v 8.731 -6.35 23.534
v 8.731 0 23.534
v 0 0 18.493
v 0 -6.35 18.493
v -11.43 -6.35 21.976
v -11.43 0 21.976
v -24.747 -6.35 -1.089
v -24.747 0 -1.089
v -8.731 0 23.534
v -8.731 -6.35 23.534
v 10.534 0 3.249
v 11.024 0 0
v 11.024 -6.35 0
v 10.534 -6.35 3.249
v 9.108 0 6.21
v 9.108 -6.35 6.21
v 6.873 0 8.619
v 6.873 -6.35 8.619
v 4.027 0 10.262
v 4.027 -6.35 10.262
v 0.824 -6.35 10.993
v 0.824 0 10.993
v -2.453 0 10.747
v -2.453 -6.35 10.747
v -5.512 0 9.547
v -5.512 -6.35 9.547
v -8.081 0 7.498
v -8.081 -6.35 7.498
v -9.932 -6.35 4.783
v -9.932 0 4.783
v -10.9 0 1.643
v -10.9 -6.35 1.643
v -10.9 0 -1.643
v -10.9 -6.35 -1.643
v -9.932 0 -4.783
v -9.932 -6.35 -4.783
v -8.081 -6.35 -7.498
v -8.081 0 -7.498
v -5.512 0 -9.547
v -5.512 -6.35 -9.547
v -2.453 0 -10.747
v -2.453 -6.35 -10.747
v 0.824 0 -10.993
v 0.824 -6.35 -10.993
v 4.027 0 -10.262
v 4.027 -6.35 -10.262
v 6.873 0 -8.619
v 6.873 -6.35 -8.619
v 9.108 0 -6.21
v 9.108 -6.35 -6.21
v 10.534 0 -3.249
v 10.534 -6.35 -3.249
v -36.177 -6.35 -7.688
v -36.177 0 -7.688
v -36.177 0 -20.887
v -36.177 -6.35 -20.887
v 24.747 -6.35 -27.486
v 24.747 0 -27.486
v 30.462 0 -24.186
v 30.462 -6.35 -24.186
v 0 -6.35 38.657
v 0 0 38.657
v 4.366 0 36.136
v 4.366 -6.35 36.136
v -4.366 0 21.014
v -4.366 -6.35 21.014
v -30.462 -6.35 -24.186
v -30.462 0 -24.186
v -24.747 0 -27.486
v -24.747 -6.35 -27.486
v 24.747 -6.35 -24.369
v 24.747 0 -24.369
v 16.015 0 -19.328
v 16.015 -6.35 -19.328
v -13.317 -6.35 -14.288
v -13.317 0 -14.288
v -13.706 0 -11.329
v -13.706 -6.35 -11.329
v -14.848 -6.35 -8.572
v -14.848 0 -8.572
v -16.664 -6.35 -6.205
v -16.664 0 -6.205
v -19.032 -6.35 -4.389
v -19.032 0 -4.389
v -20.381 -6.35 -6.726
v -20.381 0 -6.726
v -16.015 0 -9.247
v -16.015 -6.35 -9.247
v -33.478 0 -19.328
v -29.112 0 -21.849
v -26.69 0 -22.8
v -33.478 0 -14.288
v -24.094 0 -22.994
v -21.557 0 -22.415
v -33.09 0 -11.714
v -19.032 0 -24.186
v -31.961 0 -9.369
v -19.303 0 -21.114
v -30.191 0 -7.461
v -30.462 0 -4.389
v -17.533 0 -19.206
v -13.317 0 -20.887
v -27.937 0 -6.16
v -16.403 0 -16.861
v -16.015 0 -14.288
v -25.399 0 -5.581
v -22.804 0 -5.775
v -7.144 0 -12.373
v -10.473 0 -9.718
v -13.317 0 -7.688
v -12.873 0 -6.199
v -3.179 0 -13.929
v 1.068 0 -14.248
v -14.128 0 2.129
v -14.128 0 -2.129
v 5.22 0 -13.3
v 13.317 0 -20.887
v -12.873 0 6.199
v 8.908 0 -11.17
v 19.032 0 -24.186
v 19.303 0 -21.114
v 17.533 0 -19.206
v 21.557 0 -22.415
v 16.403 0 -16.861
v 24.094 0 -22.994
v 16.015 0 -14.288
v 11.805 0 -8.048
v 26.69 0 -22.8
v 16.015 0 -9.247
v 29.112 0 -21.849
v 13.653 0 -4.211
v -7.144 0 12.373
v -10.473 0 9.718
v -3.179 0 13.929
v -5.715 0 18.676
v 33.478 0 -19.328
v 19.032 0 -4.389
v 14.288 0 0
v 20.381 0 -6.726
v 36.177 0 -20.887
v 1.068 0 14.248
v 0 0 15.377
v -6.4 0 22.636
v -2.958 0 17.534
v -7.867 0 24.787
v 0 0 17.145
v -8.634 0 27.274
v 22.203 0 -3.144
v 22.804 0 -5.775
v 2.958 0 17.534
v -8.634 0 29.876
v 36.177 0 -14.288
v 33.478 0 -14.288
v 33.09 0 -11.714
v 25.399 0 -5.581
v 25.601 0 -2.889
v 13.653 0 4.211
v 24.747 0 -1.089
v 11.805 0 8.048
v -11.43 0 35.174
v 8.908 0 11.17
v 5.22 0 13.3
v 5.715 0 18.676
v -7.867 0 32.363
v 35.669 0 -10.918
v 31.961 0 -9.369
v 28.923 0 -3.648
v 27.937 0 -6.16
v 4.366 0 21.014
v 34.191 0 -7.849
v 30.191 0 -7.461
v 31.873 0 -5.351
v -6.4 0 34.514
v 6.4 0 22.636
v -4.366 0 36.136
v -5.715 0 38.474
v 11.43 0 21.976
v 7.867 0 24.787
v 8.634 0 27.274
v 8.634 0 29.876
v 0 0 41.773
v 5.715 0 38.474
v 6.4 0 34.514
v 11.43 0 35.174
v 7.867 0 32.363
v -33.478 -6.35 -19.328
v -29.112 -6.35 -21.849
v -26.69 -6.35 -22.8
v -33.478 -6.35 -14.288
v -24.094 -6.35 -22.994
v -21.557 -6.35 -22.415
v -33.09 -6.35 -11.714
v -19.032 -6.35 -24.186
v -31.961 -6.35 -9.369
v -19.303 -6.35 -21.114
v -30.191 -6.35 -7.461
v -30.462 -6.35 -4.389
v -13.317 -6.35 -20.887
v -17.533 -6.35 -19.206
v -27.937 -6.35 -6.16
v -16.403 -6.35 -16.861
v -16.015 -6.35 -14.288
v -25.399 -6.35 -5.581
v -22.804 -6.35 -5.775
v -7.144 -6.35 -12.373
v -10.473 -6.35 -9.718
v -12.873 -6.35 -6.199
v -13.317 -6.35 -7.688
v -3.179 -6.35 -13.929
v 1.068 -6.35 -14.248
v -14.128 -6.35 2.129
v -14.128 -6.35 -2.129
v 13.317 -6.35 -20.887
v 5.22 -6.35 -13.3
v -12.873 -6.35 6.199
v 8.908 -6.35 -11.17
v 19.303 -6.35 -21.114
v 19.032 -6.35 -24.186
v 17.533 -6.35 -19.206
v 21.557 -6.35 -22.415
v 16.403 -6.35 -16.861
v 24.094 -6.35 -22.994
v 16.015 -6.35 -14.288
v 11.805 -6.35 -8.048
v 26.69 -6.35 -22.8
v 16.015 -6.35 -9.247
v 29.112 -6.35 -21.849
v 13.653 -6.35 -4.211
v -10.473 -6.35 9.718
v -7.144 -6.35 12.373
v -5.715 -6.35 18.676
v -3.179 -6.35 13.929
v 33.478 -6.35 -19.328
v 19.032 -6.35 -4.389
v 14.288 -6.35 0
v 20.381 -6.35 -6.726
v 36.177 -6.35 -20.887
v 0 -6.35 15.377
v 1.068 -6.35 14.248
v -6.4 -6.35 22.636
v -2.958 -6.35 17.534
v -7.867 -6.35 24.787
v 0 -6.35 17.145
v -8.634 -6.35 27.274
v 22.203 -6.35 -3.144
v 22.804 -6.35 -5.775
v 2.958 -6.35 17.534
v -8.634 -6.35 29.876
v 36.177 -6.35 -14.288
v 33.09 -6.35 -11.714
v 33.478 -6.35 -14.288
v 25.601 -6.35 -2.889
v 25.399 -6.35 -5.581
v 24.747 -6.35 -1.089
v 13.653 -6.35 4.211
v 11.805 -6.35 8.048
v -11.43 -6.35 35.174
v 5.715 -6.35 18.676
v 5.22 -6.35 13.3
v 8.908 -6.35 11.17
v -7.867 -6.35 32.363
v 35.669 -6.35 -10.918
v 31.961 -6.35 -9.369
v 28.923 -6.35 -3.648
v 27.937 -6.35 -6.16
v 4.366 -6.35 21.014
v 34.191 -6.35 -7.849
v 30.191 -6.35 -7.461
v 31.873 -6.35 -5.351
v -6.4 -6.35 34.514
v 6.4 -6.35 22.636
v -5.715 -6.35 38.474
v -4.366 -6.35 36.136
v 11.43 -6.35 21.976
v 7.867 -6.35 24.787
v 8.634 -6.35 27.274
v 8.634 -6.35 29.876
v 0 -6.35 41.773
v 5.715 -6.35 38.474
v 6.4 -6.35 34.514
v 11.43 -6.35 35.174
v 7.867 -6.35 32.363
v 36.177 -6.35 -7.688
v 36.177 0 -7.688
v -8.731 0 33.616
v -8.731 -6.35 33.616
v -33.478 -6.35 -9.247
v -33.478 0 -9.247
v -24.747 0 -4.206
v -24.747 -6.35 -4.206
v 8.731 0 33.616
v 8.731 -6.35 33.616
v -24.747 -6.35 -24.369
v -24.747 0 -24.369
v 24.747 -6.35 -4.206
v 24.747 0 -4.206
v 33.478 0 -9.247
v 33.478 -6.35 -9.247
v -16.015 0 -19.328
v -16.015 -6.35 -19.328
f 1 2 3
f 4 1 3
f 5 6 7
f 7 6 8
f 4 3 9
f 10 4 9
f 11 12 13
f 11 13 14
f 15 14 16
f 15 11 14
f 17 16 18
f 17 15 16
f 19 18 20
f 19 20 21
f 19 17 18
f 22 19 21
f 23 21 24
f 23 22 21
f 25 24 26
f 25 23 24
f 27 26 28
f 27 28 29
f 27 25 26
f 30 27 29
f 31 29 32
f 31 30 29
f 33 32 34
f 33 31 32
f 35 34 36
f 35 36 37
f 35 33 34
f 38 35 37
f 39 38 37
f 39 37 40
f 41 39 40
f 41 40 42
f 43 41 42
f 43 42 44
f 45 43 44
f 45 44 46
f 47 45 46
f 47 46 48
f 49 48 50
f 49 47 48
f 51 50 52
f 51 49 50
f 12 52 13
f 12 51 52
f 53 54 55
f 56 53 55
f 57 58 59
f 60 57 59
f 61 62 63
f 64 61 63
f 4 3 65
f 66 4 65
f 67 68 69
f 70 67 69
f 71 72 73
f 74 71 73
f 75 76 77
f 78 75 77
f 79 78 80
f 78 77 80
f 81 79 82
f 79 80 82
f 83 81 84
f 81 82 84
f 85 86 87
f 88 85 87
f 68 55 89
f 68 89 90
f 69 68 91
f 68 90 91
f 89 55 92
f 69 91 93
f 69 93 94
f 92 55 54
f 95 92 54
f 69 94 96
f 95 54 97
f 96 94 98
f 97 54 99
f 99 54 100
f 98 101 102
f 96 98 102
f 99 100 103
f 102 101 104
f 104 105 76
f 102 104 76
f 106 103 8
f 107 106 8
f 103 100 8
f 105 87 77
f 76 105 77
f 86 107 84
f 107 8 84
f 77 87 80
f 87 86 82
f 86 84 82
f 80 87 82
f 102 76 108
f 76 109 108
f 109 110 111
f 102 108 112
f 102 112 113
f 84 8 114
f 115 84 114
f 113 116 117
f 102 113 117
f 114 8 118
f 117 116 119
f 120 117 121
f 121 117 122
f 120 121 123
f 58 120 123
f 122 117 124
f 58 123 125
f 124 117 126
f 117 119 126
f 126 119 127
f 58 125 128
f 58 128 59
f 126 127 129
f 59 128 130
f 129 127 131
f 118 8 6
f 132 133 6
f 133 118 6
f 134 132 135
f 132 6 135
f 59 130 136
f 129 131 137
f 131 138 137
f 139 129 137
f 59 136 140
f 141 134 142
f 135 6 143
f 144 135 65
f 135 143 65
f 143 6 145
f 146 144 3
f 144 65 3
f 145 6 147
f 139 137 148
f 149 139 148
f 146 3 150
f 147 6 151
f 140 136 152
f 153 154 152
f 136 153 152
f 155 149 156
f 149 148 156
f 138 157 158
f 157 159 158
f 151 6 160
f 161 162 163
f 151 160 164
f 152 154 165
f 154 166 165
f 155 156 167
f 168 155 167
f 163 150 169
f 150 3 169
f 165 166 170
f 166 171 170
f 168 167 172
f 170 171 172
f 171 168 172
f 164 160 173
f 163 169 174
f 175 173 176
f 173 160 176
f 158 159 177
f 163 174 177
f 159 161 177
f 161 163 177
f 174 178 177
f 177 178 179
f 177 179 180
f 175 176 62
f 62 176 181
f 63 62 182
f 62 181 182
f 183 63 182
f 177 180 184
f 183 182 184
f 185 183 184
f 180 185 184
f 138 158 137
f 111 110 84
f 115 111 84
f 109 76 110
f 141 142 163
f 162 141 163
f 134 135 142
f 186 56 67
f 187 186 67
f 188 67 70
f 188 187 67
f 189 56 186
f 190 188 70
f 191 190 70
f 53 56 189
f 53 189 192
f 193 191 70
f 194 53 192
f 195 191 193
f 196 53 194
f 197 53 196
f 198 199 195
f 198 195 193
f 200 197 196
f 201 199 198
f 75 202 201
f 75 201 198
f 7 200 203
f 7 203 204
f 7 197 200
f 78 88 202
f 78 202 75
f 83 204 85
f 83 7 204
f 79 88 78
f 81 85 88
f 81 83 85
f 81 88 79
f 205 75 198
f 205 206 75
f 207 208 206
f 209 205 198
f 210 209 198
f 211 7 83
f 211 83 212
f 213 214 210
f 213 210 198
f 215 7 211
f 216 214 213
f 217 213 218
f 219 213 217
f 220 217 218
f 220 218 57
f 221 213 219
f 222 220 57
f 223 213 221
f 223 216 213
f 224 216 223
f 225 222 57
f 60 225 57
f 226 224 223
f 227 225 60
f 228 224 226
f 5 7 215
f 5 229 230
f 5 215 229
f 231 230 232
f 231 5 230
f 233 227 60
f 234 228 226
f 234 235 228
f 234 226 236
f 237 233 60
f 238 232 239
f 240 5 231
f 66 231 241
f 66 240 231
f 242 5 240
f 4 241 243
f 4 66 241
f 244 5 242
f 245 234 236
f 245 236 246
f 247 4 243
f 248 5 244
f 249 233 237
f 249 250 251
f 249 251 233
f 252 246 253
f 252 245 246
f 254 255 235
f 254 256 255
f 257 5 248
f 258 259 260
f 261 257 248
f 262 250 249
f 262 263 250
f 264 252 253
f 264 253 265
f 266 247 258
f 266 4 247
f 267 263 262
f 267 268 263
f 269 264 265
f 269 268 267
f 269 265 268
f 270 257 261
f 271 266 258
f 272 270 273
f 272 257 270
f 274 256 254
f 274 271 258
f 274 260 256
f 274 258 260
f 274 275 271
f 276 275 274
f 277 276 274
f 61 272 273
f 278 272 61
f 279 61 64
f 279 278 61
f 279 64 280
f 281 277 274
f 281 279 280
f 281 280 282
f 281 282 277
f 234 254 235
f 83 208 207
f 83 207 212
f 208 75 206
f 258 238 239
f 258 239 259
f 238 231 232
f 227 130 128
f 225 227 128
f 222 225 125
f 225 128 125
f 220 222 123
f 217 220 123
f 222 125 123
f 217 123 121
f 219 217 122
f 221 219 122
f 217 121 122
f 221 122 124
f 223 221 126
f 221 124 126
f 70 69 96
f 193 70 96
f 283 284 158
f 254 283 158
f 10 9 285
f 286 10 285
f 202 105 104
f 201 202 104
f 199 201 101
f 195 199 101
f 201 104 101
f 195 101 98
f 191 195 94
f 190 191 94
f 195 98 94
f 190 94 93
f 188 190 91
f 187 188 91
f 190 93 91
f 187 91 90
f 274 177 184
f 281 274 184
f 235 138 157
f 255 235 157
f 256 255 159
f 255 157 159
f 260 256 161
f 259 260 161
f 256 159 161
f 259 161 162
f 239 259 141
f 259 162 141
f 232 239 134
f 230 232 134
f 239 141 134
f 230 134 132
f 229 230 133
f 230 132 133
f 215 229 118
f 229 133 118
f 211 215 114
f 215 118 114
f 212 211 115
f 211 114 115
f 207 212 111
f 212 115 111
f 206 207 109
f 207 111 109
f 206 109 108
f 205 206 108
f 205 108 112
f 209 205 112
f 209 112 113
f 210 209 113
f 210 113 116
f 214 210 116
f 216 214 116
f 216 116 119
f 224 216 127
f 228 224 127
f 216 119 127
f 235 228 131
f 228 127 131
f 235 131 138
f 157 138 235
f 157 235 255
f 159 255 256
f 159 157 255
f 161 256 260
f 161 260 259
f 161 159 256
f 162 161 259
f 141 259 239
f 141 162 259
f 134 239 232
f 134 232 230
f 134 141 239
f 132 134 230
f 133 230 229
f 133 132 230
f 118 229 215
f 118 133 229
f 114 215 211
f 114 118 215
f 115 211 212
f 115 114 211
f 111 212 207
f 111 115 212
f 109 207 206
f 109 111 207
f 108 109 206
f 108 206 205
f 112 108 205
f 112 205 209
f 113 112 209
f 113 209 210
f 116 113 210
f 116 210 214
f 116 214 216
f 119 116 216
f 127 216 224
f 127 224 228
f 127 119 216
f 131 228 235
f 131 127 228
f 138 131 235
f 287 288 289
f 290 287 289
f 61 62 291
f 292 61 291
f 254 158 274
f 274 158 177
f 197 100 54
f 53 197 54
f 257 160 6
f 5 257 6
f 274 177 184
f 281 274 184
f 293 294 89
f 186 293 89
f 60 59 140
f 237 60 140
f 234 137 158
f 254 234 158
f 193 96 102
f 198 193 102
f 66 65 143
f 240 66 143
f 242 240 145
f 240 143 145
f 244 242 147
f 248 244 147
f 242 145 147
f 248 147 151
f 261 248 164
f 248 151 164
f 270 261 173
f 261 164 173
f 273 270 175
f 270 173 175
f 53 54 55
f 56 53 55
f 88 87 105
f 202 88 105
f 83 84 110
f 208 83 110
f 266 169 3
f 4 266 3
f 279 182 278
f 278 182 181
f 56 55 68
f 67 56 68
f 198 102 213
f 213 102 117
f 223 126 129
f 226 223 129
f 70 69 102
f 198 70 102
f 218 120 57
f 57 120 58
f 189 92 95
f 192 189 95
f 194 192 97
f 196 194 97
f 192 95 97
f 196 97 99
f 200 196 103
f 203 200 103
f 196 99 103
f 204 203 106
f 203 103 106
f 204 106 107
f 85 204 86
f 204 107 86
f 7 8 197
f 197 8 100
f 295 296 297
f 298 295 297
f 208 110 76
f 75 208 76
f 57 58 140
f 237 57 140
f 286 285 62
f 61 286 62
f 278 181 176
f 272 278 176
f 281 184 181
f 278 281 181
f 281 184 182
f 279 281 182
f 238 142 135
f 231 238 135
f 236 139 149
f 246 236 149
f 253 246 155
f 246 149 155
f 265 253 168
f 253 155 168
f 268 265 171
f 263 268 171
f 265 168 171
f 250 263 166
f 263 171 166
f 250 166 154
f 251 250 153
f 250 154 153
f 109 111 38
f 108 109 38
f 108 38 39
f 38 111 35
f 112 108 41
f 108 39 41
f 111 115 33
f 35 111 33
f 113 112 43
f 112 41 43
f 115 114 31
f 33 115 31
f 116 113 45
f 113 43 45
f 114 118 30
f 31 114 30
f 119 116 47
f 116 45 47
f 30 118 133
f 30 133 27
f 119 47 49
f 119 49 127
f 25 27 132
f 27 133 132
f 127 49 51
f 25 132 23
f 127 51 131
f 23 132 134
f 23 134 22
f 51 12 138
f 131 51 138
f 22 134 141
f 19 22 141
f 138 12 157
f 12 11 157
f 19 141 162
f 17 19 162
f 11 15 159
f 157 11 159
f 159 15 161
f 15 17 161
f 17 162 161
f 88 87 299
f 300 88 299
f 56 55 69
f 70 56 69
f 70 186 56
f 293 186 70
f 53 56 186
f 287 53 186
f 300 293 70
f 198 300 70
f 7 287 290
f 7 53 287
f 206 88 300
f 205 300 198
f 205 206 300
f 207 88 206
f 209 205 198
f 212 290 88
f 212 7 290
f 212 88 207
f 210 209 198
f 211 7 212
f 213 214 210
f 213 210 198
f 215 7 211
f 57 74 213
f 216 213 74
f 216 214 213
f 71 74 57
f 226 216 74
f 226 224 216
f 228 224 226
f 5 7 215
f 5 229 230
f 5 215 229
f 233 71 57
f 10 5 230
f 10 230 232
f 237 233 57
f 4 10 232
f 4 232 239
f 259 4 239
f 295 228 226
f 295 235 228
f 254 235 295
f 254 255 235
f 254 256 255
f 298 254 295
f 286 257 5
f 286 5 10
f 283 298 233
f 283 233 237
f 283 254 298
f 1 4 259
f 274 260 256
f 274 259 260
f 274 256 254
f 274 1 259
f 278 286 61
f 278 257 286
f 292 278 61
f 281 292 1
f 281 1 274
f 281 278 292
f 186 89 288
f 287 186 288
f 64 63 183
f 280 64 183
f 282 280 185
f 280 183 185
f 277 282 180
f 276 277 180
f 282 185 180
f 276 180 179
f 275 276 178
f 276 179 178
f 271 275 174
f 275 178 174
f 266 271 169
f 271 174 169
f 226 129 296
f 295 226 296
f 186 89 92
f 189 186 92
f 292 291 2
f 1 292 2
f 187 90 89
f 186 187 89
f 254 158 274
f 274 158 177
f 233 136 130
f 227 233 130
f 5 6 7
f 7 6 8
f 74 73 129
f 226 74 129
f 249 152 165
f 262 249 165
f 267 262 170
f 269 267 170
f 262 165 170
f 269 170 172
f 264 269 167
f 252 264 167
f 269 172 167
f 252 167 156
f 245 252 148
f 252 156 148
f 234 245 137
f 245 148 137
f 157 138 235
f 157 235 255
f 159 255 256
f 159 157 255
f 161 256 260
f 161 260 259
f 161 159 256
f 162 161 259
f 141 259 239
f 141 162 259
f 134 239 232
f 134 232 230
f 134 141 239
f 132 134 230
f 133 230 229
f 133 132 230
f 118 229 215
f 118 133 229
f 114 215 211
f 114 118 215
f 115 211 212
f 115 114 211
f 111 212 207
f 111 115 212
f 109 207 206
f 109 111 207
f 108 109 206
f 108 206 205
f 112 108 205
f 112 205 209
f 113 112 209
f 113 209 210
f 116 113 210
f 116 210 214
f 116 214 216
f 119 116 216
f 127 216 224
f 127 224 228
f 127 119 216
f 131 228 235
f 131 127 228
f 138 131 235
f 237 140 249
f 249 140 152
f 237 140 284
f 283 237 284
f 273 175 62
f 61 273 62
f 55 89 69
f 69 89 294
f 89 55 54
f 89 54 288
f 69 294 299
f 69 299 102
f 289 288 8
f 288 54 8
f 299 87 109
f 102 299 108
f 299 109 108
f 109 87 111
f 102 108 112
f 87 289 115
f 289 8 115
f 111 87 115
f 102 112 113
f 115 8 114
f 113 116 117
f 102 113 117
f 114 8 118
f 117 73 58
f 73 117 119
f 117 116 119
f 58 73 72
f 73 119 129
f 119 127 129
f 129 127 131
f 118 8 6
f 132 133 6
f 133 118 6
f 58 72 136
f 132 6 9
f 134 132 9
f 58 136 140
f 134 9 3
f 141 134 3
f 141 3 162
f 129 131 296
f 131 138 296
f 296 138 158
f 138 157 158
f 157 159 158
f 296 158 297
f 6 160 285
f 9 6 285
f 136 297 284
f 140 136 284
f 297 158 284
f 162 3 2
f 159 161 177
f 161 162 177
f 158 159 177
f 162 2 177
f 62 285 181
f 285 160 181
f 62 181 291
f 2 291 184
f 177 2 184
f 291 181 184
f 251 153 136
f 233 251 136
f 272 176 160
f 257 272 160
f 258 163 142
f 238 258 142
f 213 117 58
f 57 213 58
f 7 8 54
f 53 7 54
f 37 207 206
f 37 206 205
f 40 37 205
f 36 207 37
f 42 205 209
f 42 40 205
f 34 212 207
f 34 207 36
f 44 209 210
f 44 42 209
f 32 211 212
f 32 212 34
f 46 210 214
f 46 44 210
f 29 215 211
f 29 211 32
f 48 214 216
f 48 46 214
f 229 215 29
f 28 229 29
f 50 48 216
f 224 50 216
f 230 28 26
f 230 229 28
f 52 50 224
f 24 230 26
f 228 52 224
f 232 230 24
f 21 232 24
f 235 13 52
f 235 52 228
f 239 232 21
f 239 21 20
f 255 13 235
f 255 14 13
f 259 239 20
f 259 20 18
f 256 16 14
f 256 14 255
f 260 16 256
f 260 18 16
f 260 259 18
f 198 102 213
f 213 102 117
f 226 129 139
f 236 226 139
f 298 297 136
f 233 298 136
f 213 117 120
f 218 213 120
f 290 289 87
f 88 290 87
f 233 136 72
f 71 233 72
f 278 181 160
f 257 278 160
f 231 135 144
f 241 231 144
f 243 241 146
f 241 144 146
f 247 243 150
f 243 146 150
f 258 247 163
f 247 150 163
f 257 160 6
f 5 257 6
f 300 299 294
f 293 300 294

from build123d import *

# Parameters (mm, degrees)
F1_R     = 14.2875
F2_DEPTH = 6.35
F0_R     = 14.2875
F0_R_2   = 11.0236
F3_DEPTH = 6.35


with BuildPart() as f2:
    # F1 (on Front) → F2 (new body)
    with BuildSketch(Plane.XZ):
        with BuildLine():
            Line((-36.1766759131, -14.2874998792), (-36.1766759131, -20.8866135768))
            Line((-36.1766759131, -20.8866135768), (-30.4616760977, -24.1861702587))
            ThreePointArc((-30.4616760977, -24.1861702587), (-34.6453463619, -20.0024998554), (-36.1766759131, -14.2874998792))
        make_face()
        with BuildLine():
            Line((-36.1766759131, -7.6883864232), (-36.1766759131, -14.2874998792))
            ThreePointArc((-36.1766759131, -14.2874998792), (-34.6453462642, -8.5724999754), (-30.4616759686, -4.3888296668))
            Line((-30.4616759686, -4.3888296668), (-36.1766759131, -7.6883864232))
        make_face()
        with BuildLine():
            ThreePointArc((-30.4616759686, -4.3888296668), (-34.6453462642, -8.5724999754), (-36.1766759131, -14.2874998792))
            ThreePointArc((-36.1766759131, -14.2874998792), (-34.6453463619, -20.0024998554), (-30.4616760977, -24.1861702587))
            ThreePointArc((-30.4616760977, -24.1861702587), (-24.7466762295, -25.7175), (-19.0316762765, -24.186170575))
            ThreePointArc((-19.0316762765, -24.186170575), (-14.8480056528, -20.0025001817), (-13.3166759131, -14.2875))
            ThreePointArc((-13.3166759131, -14.2875), (-14.8480056284, -8.5724998605), (-19.0316761921, -4.3888294737))
            ThreePointArc((-19.0316761921, -4.3888294737), (-24.7466761062, -2.8575), (-30.4616759686, -4.3888296668))
        make_face()
        with BuildLine():
            ThreePointArc((-16.0154259131, -14.2875), (-20.3810506973, -21.8489841822), (-29.1123004814, -21.848984556))
            Line((-29.1123004814, -21.848984556), (-33.4779259131, -19.3284895379))
            Line((-33.4779259131, -19.3284895379), (-33.4779259131, -14.2875))
            ThreePointArc((-33.4779259131, -14.2875), (-29.1123008814, -6.7260156749), (-20.3810508496, -6.7260157299))
            Line((-20.3810508496, -6.7260157299), (-16.0154259131, -9.2465104621))
            Line((-16.0154259131, -9.2465104621), (-16.0154259131, -14.2875))
        make_face(mode=Mode.SUBTRACT)
        with BuildLine():
            ThreePointArc((-19.0316762765, -24.186170575), (-24.7466762295, -25.7175), (-30.4616760977, -24.1861702587))
            Line((-30.4616760977, -24.1861702587), (-24.7466759131, -27.4857271537))
            Line((-24.7466759131, -27.4857271537), (-19.0316762765, -24.186170575))
        make_face()
        with BuildLine():
            Line((-24.7466759131, -1.0892728463), (-30.4616759686, -4.3888296668))
            ThreePointArc((-30.4616759686, -4.3888296668), (-24.7466761062, -2.8575), (-19.0316761921, -4.3888294737))
            Line((-19.0316761921, -4.3888294737), (-24.7466759131, -1.0892728463))
        make_face()
        with BuildLine():
            ThreePointArc((-13.3166759131, -14.2875), (-14.8480056528, -20.0025001817), (-19.0316762765, -24.186170575))
            Line((-19.0316762765, -24.186170575), (-13.3166759131, -20.8866135768))
            Line((-13.3166759131, -20.8866135768), (-13.3166759131, -14.2875))
        make_face()
        Polygon((-24.7466759131, -1.0892728463), (-19.0316761921, -4.3888294737), (-13.3166759131, -7.6883864232), (-13.3166759131, -14.2875), (-13.3166759131, -20.8866135768), (13.3166759131, -20.8866135768), (13.3166759131, -14.2875000109), (13.3166759131, -7.6883864232), (19.0316752301, -4.3888300291), (24.7466759131, -1.0892728463), (11.43, 21.9758864232), (5.7149999664, 18.6763296153), (0, 15.3767728463), (-5.7149996367, 18.676329425), (-11.43, 21.9758864232), align=None)
        Circle(F1_R, mode=Mode.SUBTRACT)
        with BuildLine():
            Line((-11.43, 28.575), (-11.43, 21.9758864232))
            Line((-11.43, 21.9758864232), (-5.7149996367, 18.676329425))
            ThreePointArc((-5.7149996367, 18.676329425), (-9.8986702604, 22.8599998183), (-11.43, 28.575))
        make_face()
        with BuildLine():
            Line((13.3166759131, -14.2875000109), (13.3166759131, -20.8866135768))
            Line((13.3166759131, -20.8866135768), (19.0316758579, -24.1861703334))
            ThreePointArc((19.0316758579, -24.1861703334), (14.8480055347, -20.0024999771), (13.3166759131, -14.2875000109))
        make_face()
        with BuildLine():
            ThreePointArc((-11.43, 28.575), (-9.8986702604, 22.8599998183), (-5.7149996367, 18.676329425))
            ThreePointArc((-5.7149996367, 18.676329425), (1.904e-07, 17.145), (5.7149999664, 18.6763296153))
            ThreePointArc((5.7149999664, 18.6763296153), (9.8986703555, 22.8599999832), (11.43, 28.575))
            ThreePointArc((11.43, 28.575), (9.8986702746, 34.290000157), (5.7149996861, 38.4736705465))
            ThreePointArc((5.7149996861, 38.4736705465), (-2.131e-07, 40.005), (-5.7150000552, 38.4736703334))
            ThreePointArc((-5.7150000552, 38.4736703334), (-9.8986703812, 34.2899999724), (-11.43, 28.575))
        make_face()
        with BuildLine():
            Line((4.3656250471, 21.0135157204), (0, 18.4930209243))
            Line((0, 18.4930209243), (-4.3656250471, 21.0135157204))
            ThreePointArc((-4.3656250471, 21.0135157204), (-8.73125, 28.575), (-4.3656250471, 36.1364842796))
            Line((-4.3656250471, 36.1364842796), (0, 38.6569790757))
            Line((0, 38.6569790757), (4.3656252998, 36.1364841337))
            ThreePointArc((4.3656252998, 36.1364841337), (7.5614843933, 32.9406248501), (8.73125, 28.575))
            ThreePointArc((8.73125, 28.575), (7.5614843204, 24.2093750235), (4.3656250471, 21.0135157204))
        make_face(mode=Mode.SUBTRACT)
        with BuildLine():
            Line((-11.43, 35.1741135768), (-11.43, 28.575))
            ThreePointArc((-11.43, 28.575), (-9.8986703812, 34.2899999724), (-5.7150000552, 38.4736703334))
            Line((-5.7150000552, 38.4736703334), (-11.43, 35.1741135768))
        make_face()
        with BuildLine():
            ThreePointArc((30.4616759683, -24.1861703334), (24.7466759131, -25.7175), (19.0316758579, -24.1861703334))
            Line((19.0316758579, -24.1861703334), (24.7466759131, -27.4857271537))
            Line((24.7466759131, -27.4857271537), (30.4616759683, -24.1861703334))
        make_face()
        with BuildLine():
            ThreePointArc((13.3166759131, -14.2875000109), (14.8480055347, -20.0024999771), (19.0316758579, -24.1861703334))
            ThreePointArc((19.0316758579, -24.1861703334), (24.7466759131, -25.7175), (30.4616759683, -24.1861703334))
            ThreePointArc((30.4616759683, -24.1861703334), (34.6453462943, -20.0024999724), (36.1766759131, -14.2875))
            ThreePointArc((36.1766759131, -14.2875), (30.4616755716, -4.3888294376), (19.0316752301, -4.3888300291))
            ThreePointArc((19.0316752301, -4.3888300291), (14.848005348, -8.5725003462), (13.3166759131, -14.2875000109))
        make_face()
        with BuildLine():
            ThreePointArc((29.1123009602, -21.8489842796), (20.3810509649, -21.8489843367), (16.0154259131, -14.2875000653))
            Line((16.0154259131, -14.2875000653), (16.0154259131, -9.2465104621))
            Line((16.0154259131, -9.2465104621), (20.3810511086, -6.7260155804))
            ThreePointArc((20.3810511086, -6.7260155804), (29.1123010109, -6.7260157496), (33.4779259131, -14.2875))
            Line((33.4779259131, -14.2875), (33.4779259131, -19.3284895379))
            Line((33.4779259131, -19.3284895379), (29.1123009602, -21.8489842796))
        make_face(mode=Mode.SUBTRACT)
        with BuildLine():
            Line((13.3166759131, -7.6883864232), (13.3166759131, -14.2875000109))
            ThreePointArc((13.3166759131, -14.2875000109), (14.848005348, -8.5725003462), (19.0316752301, -4.3888300291))
            Line((19.0316752301, -4.3888300291), (13.3166759131, -7.6883864232))
        make_face()
        with BuildLine():
            ThreePointArc((11.43, 28.575), (9.8986703555, 22.8599999832), (5.7149999664, 18.6763296153))
            Line((5.7149999664, 18.6763296153), (11.43, 21.9758864232))
            Line((11.43, 21.9758864232), (11.43, 28.575))
        make_face()
        with BuildLine():
            Line((0, 41.7732271537), (-5.7150000552, 38.4736703334))
            ThreePointArc((-5.7150000552, 38.4736703334), (-2.131e-07, 40.005), (5.7149996861, 38.4736705465))
            Line((5.7149996861, 38.4736705465), (0, 41.7732271537))
        make_face()
        with BuildLine():
            ThreePointArc((36.1766759131, -14.2875), (34.6453462943, -20.0024999724), (30.4616759683, -24.1861703334))
            Line((30.4616759683, -24.1861703334), (36.1766759131, -20.8866135768))
            Line((36.1766759131, -20.8866135768), (36.1766759131, -14.2875))
        make_face()
        with BuildLine():
            ThreePointArc((5.7149996861, 38.4736705465), (9.8986702746, 34.290000157), (11.43, 28.575))
            Line((11.43, 28.575), (11.43, 35.1741135768))
            Line((11.43, 35.1741135768), (5.7149996861, 38.4736705465))
        make_face()
    extrude(amount=F2_DEPTH)


with BuildPart() as f2b:
    # F0 (on Front) → F2, piece 2 (new body)
    with BuildSketch(Plane.XZ):
        Circle(F0_R)
        Circle(F0_R_2, mode=Mode.SUBTRACT)
    extrude(amount=F2_DEPTH)


with BuildPart() as f3:
    # F0 (on Front) → F3 (new body)
    with BuildSketch(Plane.XZ):
        Polygon((-11.43, 35.1741135768), (-11.43, 21.9758864232), (0, 15.3767728463), (11.43, 21.9758864232), (11.43, 35.1741135768), (0, 41.7732271537), align=None)
        Polygon((0, 38.6569790757), (8.73125, 33.6159895379), (8.73125, 23.5340104621), (0, 18.4930209243), (-8.73125, 23.5340104621), (-8.73125, 33.6159895379), align=None, mode=Mode.SUBTRACT)
        Polygon((0, 15.3767728463), (-11.43, 21.9758864232), (-24.7466759131, -1.0892728463), (-13.3166759131, -7.6883864232), (-13.3166759131, -20.8866135768), (13.3166759131, -20.8866135768), (13.3166759131, -7.6883864232), (24.7466759131, -1.0892728463), (11.43, 21.9758864232), align=None)
        Circle(F0_R, mode=Mode.SUBTRACT)
        Polygon((-13.3166759131, -7.6883864232), (-24.7466759131, -1.0892728463), (-36.1766759131, -7.6883864232), (-36.1766759131, -20.8866135768), (-24.7466759131, -27.4857271537), (-13.3166759131, -20.8866135768), align=None)
        Polygon((-33.4779259131, -19.3284895379), (-33.4779259131, -9.2465104621), (-24.7466759131, -4.2055209243), (-16.0154259131, -9.2465104621), (-16.0154259131, -19.3284895379), (-24.7466759131, -24.3694790757), align=None, mode=Mode.SUBTRACT)
        Polygon((36.1766759131, -7.6883864232), (24.7466759131, -1.0892728463), (13.3166759131, -7.6883864232), (13.3166759131, -20.8866135768), (24.7466759131, -27.4857271537), (36.1766759131, -20.8866135768), align=None)
        Polygon((33.4779259131, -19.3284895379), (24.7466759131, -24.3694790757), (16.0154259131, -19.3284895379), (16.0154259131, -9.2465104621), (24.7466759131, -4.2055209243), (33.4779259131, -9.2465104621), align=None, mode=Mode.SUBTRACT)
    extrude(amount=F3_DEPTH)


solid = Compound([f2.part, f2b.part, f3.part])
